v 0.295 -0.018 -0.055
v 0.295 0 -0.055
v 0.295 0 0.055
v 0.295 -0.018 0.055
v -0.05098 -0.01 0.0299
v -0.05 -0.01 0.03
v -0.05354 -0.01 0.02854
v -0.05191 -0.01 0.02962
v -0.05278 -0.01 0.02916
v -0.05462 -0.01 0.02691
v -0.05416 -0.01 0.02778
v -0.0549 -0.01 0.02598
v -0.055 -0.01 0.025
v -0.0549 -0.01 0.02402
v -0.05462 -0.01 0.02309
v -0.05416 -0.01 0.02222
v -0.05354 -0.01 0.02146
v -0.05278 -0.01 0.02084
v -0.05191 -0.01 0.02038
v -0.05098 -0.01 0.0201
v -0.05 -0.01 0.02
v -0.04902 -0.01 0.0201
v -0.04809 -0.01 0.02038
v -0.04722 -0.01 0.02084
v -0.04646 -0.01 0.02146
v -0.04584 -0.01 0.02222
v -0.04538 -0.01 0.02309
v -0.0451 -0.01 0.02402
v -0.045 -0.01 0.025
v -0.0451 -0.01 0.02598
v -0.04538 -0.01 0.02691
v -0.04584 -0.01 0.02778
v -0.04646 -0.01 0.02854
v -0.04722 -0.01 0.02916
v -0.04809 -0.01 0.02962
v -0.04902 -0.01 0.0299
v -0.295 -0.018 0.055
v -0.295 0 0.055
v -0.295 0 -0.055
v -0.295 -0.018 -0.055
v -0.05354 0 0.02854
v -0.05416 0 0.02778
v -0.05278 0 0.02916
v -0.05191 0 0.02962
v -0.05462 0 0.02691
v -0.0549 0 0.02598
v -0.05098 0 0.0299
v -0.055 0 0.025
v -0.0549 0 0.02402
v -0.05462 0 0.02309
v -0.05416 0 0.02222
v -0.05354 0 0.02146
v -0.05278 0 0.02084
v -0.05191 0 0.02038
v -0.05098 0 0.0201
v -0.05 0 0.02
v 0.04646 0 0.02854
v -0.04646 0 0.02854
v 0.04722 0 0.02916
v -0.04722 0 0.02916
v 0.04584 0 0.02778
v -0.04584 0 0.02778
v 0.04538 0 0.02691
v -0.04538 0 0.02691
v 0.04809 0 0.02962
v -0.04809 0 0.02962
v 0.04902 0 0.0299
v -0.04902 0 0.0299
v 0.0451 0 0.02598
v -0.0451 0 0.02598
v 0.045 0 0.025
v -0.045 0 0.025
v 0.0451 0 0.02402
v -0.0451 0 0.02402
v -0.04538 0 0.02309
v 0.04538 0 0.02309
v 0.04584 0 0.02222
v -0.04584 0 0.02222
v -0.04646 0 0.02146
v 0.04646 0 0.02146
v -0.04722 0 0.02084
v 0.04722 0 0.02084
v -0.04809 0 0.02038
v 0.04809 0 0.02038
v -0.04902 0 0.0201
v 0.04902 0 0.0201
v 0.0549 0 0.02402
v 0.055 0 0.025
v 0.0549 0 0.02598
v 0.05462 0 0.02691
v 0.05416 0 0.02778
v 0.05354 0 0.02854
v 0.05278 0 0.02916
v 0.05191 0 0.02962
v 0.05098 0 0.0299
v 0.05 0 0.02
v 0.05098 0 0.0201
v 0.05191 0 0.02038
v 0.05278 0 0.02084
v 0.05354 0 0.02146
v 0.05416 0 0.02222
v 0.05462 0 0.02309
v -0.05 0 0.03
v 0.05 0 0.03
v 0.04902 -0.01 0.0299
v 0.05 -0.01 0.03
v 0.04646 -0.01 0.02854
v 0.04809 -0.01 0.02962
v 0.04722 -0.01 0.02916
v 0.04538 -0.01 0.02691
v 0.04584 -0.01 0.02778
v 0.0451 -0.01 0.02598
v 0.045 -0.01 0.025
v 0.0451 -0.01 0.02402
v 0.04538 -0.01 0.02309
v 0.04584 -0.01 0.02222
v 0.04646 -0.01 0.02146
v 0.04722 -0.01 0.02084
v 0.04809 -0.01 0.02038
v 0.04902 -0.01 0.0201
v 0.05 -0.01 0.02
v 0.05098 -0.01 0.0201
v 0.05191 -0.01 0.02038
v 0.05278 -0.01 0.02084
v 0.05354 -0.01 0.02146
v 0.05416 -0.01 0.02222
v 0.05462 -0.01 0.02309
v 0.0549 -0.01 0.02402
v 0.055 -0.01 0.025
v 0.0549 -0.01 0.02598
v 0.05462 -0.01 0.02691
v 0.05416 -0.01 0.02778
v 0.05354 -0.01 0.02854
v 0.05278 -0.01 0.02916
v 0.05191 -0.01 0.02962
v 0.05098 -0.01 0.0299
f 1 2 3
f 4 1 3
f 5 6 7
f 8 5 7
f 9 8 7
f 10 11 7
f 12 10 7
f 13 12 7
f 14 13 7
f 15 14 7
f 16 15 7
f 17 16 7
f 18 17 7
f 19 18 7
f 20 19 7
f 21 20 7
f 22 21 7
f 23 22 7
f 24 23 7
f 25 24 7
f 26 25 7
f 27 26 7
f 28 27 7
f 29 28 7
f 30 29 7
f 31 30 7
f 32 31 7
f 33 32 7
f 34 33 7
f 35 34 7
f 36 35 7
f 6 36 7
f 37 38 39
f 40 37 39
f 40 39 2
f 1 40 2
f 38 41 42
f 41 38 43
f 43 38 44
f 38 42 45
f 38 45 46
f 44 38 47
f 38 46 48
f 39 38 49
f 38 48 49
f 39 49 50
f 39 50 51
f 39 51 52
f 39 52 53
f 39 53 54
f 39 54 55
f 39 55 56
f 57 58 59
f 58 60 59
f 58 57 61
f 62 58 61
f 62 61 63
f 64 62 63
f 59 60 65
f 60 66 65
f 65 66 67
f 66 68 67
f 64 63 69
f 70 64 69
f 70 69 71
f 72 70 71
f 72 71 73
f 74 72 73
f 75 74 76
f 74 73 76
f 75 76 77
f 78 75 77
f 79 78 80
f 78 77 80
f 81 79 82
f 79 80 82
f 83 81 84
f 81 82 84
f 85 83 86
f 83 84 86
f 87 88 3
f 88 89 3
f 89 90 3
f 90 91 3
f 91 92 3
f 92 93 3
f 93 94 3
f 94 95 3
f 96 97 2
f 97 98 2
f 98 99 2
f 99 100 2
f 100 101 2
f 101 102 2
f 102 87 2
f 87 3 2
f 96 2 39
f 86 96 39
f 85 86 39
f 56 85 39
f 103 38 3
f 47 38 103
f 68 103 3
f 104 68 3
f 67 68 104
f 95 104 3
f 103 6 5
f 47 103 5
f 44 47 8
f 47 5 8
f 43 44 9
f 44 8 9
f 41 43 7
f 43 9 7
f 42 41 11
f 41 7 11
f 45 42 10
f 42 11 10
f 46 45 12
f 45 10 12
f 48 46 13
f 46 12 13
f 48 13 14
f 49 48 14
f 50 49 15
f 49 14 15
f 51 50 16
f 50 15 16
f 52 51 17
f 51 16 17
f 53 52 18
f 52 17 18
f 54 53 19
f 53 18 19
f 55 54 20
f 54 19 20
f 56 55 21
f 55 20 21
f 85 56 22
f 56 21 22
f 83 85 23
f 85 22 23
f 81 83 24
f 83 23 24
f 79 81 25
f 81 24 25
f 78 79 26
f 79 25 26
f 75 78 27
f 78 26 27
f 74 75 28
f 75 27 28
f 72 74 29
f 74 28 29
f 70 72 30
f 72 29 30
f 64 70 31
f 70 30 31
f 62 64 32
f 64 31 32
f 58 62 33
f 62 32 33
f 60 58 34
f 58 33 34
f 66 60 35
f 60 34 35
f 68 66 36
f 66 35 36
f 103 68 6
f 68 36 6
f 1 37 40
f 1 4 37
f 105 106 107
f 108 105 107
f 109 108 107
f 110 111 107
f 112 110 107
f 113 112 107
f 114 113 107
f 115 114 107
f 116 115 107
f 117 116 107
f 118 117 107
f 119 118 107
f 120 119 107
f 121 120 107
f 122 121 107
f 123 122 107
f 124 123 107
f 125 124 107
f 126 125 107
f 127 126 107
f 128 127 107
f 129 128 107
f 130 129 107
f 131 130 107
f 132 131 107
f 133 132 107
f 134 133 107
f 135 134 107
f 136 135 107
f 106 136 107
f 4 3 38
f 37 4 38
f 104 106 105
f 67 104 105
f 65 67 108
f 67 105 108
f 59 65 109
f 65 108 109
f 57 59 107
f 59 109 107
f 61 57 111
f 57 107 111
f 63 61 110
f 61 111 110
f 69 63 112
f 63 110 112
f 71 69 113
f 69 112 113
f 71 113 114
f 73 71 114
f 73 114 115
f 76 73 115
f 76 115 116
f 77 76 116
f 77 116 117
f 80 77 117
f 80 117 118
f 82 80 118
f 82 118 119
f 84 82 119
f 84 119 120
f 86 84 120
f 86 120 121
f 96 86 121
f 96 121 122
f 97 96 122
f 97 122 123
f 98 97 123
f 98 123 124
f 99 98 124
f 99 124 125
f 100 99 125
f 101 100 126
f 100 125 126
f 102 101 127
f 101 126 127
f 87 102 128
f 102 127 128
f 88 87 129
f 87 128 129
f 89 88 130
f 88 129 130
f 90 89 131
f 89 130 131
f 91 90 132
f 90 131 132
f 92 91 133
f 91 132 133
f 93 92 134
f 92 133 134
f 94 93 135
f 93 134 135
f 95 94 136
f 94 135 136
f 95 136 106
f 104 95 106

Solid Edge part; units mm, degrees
sketch "Sketch1" plane through (0, 0, 0) normal (0, -1, 0) x (1, 0, 0)
  line L0 (-0.295, -0.055) -> (0.295, -0.055)
  line L1 (0.295, -0.055) -> (0.295, 0.055)
  line L2 (0.295, 0.055) -> (-0.295, 0.055)
  line L3 (-0.295, 0.055) -> (-0.295, -0.055)
  dimension "D1" = 0.11
  dimension "D2" = 0.59
extrude "Protrusion1" add sketch "Sketch1" along normal blind 0.018
hole "Bohrung_1" at (-0.05, 0, 0.025) direction (0, -1, 0) diameter 0.01 depth 0.01
hole "Hole1" at (0.05, 0, 0.025) direction (0, -1, 0) diameter 0.01 depth 0.01
